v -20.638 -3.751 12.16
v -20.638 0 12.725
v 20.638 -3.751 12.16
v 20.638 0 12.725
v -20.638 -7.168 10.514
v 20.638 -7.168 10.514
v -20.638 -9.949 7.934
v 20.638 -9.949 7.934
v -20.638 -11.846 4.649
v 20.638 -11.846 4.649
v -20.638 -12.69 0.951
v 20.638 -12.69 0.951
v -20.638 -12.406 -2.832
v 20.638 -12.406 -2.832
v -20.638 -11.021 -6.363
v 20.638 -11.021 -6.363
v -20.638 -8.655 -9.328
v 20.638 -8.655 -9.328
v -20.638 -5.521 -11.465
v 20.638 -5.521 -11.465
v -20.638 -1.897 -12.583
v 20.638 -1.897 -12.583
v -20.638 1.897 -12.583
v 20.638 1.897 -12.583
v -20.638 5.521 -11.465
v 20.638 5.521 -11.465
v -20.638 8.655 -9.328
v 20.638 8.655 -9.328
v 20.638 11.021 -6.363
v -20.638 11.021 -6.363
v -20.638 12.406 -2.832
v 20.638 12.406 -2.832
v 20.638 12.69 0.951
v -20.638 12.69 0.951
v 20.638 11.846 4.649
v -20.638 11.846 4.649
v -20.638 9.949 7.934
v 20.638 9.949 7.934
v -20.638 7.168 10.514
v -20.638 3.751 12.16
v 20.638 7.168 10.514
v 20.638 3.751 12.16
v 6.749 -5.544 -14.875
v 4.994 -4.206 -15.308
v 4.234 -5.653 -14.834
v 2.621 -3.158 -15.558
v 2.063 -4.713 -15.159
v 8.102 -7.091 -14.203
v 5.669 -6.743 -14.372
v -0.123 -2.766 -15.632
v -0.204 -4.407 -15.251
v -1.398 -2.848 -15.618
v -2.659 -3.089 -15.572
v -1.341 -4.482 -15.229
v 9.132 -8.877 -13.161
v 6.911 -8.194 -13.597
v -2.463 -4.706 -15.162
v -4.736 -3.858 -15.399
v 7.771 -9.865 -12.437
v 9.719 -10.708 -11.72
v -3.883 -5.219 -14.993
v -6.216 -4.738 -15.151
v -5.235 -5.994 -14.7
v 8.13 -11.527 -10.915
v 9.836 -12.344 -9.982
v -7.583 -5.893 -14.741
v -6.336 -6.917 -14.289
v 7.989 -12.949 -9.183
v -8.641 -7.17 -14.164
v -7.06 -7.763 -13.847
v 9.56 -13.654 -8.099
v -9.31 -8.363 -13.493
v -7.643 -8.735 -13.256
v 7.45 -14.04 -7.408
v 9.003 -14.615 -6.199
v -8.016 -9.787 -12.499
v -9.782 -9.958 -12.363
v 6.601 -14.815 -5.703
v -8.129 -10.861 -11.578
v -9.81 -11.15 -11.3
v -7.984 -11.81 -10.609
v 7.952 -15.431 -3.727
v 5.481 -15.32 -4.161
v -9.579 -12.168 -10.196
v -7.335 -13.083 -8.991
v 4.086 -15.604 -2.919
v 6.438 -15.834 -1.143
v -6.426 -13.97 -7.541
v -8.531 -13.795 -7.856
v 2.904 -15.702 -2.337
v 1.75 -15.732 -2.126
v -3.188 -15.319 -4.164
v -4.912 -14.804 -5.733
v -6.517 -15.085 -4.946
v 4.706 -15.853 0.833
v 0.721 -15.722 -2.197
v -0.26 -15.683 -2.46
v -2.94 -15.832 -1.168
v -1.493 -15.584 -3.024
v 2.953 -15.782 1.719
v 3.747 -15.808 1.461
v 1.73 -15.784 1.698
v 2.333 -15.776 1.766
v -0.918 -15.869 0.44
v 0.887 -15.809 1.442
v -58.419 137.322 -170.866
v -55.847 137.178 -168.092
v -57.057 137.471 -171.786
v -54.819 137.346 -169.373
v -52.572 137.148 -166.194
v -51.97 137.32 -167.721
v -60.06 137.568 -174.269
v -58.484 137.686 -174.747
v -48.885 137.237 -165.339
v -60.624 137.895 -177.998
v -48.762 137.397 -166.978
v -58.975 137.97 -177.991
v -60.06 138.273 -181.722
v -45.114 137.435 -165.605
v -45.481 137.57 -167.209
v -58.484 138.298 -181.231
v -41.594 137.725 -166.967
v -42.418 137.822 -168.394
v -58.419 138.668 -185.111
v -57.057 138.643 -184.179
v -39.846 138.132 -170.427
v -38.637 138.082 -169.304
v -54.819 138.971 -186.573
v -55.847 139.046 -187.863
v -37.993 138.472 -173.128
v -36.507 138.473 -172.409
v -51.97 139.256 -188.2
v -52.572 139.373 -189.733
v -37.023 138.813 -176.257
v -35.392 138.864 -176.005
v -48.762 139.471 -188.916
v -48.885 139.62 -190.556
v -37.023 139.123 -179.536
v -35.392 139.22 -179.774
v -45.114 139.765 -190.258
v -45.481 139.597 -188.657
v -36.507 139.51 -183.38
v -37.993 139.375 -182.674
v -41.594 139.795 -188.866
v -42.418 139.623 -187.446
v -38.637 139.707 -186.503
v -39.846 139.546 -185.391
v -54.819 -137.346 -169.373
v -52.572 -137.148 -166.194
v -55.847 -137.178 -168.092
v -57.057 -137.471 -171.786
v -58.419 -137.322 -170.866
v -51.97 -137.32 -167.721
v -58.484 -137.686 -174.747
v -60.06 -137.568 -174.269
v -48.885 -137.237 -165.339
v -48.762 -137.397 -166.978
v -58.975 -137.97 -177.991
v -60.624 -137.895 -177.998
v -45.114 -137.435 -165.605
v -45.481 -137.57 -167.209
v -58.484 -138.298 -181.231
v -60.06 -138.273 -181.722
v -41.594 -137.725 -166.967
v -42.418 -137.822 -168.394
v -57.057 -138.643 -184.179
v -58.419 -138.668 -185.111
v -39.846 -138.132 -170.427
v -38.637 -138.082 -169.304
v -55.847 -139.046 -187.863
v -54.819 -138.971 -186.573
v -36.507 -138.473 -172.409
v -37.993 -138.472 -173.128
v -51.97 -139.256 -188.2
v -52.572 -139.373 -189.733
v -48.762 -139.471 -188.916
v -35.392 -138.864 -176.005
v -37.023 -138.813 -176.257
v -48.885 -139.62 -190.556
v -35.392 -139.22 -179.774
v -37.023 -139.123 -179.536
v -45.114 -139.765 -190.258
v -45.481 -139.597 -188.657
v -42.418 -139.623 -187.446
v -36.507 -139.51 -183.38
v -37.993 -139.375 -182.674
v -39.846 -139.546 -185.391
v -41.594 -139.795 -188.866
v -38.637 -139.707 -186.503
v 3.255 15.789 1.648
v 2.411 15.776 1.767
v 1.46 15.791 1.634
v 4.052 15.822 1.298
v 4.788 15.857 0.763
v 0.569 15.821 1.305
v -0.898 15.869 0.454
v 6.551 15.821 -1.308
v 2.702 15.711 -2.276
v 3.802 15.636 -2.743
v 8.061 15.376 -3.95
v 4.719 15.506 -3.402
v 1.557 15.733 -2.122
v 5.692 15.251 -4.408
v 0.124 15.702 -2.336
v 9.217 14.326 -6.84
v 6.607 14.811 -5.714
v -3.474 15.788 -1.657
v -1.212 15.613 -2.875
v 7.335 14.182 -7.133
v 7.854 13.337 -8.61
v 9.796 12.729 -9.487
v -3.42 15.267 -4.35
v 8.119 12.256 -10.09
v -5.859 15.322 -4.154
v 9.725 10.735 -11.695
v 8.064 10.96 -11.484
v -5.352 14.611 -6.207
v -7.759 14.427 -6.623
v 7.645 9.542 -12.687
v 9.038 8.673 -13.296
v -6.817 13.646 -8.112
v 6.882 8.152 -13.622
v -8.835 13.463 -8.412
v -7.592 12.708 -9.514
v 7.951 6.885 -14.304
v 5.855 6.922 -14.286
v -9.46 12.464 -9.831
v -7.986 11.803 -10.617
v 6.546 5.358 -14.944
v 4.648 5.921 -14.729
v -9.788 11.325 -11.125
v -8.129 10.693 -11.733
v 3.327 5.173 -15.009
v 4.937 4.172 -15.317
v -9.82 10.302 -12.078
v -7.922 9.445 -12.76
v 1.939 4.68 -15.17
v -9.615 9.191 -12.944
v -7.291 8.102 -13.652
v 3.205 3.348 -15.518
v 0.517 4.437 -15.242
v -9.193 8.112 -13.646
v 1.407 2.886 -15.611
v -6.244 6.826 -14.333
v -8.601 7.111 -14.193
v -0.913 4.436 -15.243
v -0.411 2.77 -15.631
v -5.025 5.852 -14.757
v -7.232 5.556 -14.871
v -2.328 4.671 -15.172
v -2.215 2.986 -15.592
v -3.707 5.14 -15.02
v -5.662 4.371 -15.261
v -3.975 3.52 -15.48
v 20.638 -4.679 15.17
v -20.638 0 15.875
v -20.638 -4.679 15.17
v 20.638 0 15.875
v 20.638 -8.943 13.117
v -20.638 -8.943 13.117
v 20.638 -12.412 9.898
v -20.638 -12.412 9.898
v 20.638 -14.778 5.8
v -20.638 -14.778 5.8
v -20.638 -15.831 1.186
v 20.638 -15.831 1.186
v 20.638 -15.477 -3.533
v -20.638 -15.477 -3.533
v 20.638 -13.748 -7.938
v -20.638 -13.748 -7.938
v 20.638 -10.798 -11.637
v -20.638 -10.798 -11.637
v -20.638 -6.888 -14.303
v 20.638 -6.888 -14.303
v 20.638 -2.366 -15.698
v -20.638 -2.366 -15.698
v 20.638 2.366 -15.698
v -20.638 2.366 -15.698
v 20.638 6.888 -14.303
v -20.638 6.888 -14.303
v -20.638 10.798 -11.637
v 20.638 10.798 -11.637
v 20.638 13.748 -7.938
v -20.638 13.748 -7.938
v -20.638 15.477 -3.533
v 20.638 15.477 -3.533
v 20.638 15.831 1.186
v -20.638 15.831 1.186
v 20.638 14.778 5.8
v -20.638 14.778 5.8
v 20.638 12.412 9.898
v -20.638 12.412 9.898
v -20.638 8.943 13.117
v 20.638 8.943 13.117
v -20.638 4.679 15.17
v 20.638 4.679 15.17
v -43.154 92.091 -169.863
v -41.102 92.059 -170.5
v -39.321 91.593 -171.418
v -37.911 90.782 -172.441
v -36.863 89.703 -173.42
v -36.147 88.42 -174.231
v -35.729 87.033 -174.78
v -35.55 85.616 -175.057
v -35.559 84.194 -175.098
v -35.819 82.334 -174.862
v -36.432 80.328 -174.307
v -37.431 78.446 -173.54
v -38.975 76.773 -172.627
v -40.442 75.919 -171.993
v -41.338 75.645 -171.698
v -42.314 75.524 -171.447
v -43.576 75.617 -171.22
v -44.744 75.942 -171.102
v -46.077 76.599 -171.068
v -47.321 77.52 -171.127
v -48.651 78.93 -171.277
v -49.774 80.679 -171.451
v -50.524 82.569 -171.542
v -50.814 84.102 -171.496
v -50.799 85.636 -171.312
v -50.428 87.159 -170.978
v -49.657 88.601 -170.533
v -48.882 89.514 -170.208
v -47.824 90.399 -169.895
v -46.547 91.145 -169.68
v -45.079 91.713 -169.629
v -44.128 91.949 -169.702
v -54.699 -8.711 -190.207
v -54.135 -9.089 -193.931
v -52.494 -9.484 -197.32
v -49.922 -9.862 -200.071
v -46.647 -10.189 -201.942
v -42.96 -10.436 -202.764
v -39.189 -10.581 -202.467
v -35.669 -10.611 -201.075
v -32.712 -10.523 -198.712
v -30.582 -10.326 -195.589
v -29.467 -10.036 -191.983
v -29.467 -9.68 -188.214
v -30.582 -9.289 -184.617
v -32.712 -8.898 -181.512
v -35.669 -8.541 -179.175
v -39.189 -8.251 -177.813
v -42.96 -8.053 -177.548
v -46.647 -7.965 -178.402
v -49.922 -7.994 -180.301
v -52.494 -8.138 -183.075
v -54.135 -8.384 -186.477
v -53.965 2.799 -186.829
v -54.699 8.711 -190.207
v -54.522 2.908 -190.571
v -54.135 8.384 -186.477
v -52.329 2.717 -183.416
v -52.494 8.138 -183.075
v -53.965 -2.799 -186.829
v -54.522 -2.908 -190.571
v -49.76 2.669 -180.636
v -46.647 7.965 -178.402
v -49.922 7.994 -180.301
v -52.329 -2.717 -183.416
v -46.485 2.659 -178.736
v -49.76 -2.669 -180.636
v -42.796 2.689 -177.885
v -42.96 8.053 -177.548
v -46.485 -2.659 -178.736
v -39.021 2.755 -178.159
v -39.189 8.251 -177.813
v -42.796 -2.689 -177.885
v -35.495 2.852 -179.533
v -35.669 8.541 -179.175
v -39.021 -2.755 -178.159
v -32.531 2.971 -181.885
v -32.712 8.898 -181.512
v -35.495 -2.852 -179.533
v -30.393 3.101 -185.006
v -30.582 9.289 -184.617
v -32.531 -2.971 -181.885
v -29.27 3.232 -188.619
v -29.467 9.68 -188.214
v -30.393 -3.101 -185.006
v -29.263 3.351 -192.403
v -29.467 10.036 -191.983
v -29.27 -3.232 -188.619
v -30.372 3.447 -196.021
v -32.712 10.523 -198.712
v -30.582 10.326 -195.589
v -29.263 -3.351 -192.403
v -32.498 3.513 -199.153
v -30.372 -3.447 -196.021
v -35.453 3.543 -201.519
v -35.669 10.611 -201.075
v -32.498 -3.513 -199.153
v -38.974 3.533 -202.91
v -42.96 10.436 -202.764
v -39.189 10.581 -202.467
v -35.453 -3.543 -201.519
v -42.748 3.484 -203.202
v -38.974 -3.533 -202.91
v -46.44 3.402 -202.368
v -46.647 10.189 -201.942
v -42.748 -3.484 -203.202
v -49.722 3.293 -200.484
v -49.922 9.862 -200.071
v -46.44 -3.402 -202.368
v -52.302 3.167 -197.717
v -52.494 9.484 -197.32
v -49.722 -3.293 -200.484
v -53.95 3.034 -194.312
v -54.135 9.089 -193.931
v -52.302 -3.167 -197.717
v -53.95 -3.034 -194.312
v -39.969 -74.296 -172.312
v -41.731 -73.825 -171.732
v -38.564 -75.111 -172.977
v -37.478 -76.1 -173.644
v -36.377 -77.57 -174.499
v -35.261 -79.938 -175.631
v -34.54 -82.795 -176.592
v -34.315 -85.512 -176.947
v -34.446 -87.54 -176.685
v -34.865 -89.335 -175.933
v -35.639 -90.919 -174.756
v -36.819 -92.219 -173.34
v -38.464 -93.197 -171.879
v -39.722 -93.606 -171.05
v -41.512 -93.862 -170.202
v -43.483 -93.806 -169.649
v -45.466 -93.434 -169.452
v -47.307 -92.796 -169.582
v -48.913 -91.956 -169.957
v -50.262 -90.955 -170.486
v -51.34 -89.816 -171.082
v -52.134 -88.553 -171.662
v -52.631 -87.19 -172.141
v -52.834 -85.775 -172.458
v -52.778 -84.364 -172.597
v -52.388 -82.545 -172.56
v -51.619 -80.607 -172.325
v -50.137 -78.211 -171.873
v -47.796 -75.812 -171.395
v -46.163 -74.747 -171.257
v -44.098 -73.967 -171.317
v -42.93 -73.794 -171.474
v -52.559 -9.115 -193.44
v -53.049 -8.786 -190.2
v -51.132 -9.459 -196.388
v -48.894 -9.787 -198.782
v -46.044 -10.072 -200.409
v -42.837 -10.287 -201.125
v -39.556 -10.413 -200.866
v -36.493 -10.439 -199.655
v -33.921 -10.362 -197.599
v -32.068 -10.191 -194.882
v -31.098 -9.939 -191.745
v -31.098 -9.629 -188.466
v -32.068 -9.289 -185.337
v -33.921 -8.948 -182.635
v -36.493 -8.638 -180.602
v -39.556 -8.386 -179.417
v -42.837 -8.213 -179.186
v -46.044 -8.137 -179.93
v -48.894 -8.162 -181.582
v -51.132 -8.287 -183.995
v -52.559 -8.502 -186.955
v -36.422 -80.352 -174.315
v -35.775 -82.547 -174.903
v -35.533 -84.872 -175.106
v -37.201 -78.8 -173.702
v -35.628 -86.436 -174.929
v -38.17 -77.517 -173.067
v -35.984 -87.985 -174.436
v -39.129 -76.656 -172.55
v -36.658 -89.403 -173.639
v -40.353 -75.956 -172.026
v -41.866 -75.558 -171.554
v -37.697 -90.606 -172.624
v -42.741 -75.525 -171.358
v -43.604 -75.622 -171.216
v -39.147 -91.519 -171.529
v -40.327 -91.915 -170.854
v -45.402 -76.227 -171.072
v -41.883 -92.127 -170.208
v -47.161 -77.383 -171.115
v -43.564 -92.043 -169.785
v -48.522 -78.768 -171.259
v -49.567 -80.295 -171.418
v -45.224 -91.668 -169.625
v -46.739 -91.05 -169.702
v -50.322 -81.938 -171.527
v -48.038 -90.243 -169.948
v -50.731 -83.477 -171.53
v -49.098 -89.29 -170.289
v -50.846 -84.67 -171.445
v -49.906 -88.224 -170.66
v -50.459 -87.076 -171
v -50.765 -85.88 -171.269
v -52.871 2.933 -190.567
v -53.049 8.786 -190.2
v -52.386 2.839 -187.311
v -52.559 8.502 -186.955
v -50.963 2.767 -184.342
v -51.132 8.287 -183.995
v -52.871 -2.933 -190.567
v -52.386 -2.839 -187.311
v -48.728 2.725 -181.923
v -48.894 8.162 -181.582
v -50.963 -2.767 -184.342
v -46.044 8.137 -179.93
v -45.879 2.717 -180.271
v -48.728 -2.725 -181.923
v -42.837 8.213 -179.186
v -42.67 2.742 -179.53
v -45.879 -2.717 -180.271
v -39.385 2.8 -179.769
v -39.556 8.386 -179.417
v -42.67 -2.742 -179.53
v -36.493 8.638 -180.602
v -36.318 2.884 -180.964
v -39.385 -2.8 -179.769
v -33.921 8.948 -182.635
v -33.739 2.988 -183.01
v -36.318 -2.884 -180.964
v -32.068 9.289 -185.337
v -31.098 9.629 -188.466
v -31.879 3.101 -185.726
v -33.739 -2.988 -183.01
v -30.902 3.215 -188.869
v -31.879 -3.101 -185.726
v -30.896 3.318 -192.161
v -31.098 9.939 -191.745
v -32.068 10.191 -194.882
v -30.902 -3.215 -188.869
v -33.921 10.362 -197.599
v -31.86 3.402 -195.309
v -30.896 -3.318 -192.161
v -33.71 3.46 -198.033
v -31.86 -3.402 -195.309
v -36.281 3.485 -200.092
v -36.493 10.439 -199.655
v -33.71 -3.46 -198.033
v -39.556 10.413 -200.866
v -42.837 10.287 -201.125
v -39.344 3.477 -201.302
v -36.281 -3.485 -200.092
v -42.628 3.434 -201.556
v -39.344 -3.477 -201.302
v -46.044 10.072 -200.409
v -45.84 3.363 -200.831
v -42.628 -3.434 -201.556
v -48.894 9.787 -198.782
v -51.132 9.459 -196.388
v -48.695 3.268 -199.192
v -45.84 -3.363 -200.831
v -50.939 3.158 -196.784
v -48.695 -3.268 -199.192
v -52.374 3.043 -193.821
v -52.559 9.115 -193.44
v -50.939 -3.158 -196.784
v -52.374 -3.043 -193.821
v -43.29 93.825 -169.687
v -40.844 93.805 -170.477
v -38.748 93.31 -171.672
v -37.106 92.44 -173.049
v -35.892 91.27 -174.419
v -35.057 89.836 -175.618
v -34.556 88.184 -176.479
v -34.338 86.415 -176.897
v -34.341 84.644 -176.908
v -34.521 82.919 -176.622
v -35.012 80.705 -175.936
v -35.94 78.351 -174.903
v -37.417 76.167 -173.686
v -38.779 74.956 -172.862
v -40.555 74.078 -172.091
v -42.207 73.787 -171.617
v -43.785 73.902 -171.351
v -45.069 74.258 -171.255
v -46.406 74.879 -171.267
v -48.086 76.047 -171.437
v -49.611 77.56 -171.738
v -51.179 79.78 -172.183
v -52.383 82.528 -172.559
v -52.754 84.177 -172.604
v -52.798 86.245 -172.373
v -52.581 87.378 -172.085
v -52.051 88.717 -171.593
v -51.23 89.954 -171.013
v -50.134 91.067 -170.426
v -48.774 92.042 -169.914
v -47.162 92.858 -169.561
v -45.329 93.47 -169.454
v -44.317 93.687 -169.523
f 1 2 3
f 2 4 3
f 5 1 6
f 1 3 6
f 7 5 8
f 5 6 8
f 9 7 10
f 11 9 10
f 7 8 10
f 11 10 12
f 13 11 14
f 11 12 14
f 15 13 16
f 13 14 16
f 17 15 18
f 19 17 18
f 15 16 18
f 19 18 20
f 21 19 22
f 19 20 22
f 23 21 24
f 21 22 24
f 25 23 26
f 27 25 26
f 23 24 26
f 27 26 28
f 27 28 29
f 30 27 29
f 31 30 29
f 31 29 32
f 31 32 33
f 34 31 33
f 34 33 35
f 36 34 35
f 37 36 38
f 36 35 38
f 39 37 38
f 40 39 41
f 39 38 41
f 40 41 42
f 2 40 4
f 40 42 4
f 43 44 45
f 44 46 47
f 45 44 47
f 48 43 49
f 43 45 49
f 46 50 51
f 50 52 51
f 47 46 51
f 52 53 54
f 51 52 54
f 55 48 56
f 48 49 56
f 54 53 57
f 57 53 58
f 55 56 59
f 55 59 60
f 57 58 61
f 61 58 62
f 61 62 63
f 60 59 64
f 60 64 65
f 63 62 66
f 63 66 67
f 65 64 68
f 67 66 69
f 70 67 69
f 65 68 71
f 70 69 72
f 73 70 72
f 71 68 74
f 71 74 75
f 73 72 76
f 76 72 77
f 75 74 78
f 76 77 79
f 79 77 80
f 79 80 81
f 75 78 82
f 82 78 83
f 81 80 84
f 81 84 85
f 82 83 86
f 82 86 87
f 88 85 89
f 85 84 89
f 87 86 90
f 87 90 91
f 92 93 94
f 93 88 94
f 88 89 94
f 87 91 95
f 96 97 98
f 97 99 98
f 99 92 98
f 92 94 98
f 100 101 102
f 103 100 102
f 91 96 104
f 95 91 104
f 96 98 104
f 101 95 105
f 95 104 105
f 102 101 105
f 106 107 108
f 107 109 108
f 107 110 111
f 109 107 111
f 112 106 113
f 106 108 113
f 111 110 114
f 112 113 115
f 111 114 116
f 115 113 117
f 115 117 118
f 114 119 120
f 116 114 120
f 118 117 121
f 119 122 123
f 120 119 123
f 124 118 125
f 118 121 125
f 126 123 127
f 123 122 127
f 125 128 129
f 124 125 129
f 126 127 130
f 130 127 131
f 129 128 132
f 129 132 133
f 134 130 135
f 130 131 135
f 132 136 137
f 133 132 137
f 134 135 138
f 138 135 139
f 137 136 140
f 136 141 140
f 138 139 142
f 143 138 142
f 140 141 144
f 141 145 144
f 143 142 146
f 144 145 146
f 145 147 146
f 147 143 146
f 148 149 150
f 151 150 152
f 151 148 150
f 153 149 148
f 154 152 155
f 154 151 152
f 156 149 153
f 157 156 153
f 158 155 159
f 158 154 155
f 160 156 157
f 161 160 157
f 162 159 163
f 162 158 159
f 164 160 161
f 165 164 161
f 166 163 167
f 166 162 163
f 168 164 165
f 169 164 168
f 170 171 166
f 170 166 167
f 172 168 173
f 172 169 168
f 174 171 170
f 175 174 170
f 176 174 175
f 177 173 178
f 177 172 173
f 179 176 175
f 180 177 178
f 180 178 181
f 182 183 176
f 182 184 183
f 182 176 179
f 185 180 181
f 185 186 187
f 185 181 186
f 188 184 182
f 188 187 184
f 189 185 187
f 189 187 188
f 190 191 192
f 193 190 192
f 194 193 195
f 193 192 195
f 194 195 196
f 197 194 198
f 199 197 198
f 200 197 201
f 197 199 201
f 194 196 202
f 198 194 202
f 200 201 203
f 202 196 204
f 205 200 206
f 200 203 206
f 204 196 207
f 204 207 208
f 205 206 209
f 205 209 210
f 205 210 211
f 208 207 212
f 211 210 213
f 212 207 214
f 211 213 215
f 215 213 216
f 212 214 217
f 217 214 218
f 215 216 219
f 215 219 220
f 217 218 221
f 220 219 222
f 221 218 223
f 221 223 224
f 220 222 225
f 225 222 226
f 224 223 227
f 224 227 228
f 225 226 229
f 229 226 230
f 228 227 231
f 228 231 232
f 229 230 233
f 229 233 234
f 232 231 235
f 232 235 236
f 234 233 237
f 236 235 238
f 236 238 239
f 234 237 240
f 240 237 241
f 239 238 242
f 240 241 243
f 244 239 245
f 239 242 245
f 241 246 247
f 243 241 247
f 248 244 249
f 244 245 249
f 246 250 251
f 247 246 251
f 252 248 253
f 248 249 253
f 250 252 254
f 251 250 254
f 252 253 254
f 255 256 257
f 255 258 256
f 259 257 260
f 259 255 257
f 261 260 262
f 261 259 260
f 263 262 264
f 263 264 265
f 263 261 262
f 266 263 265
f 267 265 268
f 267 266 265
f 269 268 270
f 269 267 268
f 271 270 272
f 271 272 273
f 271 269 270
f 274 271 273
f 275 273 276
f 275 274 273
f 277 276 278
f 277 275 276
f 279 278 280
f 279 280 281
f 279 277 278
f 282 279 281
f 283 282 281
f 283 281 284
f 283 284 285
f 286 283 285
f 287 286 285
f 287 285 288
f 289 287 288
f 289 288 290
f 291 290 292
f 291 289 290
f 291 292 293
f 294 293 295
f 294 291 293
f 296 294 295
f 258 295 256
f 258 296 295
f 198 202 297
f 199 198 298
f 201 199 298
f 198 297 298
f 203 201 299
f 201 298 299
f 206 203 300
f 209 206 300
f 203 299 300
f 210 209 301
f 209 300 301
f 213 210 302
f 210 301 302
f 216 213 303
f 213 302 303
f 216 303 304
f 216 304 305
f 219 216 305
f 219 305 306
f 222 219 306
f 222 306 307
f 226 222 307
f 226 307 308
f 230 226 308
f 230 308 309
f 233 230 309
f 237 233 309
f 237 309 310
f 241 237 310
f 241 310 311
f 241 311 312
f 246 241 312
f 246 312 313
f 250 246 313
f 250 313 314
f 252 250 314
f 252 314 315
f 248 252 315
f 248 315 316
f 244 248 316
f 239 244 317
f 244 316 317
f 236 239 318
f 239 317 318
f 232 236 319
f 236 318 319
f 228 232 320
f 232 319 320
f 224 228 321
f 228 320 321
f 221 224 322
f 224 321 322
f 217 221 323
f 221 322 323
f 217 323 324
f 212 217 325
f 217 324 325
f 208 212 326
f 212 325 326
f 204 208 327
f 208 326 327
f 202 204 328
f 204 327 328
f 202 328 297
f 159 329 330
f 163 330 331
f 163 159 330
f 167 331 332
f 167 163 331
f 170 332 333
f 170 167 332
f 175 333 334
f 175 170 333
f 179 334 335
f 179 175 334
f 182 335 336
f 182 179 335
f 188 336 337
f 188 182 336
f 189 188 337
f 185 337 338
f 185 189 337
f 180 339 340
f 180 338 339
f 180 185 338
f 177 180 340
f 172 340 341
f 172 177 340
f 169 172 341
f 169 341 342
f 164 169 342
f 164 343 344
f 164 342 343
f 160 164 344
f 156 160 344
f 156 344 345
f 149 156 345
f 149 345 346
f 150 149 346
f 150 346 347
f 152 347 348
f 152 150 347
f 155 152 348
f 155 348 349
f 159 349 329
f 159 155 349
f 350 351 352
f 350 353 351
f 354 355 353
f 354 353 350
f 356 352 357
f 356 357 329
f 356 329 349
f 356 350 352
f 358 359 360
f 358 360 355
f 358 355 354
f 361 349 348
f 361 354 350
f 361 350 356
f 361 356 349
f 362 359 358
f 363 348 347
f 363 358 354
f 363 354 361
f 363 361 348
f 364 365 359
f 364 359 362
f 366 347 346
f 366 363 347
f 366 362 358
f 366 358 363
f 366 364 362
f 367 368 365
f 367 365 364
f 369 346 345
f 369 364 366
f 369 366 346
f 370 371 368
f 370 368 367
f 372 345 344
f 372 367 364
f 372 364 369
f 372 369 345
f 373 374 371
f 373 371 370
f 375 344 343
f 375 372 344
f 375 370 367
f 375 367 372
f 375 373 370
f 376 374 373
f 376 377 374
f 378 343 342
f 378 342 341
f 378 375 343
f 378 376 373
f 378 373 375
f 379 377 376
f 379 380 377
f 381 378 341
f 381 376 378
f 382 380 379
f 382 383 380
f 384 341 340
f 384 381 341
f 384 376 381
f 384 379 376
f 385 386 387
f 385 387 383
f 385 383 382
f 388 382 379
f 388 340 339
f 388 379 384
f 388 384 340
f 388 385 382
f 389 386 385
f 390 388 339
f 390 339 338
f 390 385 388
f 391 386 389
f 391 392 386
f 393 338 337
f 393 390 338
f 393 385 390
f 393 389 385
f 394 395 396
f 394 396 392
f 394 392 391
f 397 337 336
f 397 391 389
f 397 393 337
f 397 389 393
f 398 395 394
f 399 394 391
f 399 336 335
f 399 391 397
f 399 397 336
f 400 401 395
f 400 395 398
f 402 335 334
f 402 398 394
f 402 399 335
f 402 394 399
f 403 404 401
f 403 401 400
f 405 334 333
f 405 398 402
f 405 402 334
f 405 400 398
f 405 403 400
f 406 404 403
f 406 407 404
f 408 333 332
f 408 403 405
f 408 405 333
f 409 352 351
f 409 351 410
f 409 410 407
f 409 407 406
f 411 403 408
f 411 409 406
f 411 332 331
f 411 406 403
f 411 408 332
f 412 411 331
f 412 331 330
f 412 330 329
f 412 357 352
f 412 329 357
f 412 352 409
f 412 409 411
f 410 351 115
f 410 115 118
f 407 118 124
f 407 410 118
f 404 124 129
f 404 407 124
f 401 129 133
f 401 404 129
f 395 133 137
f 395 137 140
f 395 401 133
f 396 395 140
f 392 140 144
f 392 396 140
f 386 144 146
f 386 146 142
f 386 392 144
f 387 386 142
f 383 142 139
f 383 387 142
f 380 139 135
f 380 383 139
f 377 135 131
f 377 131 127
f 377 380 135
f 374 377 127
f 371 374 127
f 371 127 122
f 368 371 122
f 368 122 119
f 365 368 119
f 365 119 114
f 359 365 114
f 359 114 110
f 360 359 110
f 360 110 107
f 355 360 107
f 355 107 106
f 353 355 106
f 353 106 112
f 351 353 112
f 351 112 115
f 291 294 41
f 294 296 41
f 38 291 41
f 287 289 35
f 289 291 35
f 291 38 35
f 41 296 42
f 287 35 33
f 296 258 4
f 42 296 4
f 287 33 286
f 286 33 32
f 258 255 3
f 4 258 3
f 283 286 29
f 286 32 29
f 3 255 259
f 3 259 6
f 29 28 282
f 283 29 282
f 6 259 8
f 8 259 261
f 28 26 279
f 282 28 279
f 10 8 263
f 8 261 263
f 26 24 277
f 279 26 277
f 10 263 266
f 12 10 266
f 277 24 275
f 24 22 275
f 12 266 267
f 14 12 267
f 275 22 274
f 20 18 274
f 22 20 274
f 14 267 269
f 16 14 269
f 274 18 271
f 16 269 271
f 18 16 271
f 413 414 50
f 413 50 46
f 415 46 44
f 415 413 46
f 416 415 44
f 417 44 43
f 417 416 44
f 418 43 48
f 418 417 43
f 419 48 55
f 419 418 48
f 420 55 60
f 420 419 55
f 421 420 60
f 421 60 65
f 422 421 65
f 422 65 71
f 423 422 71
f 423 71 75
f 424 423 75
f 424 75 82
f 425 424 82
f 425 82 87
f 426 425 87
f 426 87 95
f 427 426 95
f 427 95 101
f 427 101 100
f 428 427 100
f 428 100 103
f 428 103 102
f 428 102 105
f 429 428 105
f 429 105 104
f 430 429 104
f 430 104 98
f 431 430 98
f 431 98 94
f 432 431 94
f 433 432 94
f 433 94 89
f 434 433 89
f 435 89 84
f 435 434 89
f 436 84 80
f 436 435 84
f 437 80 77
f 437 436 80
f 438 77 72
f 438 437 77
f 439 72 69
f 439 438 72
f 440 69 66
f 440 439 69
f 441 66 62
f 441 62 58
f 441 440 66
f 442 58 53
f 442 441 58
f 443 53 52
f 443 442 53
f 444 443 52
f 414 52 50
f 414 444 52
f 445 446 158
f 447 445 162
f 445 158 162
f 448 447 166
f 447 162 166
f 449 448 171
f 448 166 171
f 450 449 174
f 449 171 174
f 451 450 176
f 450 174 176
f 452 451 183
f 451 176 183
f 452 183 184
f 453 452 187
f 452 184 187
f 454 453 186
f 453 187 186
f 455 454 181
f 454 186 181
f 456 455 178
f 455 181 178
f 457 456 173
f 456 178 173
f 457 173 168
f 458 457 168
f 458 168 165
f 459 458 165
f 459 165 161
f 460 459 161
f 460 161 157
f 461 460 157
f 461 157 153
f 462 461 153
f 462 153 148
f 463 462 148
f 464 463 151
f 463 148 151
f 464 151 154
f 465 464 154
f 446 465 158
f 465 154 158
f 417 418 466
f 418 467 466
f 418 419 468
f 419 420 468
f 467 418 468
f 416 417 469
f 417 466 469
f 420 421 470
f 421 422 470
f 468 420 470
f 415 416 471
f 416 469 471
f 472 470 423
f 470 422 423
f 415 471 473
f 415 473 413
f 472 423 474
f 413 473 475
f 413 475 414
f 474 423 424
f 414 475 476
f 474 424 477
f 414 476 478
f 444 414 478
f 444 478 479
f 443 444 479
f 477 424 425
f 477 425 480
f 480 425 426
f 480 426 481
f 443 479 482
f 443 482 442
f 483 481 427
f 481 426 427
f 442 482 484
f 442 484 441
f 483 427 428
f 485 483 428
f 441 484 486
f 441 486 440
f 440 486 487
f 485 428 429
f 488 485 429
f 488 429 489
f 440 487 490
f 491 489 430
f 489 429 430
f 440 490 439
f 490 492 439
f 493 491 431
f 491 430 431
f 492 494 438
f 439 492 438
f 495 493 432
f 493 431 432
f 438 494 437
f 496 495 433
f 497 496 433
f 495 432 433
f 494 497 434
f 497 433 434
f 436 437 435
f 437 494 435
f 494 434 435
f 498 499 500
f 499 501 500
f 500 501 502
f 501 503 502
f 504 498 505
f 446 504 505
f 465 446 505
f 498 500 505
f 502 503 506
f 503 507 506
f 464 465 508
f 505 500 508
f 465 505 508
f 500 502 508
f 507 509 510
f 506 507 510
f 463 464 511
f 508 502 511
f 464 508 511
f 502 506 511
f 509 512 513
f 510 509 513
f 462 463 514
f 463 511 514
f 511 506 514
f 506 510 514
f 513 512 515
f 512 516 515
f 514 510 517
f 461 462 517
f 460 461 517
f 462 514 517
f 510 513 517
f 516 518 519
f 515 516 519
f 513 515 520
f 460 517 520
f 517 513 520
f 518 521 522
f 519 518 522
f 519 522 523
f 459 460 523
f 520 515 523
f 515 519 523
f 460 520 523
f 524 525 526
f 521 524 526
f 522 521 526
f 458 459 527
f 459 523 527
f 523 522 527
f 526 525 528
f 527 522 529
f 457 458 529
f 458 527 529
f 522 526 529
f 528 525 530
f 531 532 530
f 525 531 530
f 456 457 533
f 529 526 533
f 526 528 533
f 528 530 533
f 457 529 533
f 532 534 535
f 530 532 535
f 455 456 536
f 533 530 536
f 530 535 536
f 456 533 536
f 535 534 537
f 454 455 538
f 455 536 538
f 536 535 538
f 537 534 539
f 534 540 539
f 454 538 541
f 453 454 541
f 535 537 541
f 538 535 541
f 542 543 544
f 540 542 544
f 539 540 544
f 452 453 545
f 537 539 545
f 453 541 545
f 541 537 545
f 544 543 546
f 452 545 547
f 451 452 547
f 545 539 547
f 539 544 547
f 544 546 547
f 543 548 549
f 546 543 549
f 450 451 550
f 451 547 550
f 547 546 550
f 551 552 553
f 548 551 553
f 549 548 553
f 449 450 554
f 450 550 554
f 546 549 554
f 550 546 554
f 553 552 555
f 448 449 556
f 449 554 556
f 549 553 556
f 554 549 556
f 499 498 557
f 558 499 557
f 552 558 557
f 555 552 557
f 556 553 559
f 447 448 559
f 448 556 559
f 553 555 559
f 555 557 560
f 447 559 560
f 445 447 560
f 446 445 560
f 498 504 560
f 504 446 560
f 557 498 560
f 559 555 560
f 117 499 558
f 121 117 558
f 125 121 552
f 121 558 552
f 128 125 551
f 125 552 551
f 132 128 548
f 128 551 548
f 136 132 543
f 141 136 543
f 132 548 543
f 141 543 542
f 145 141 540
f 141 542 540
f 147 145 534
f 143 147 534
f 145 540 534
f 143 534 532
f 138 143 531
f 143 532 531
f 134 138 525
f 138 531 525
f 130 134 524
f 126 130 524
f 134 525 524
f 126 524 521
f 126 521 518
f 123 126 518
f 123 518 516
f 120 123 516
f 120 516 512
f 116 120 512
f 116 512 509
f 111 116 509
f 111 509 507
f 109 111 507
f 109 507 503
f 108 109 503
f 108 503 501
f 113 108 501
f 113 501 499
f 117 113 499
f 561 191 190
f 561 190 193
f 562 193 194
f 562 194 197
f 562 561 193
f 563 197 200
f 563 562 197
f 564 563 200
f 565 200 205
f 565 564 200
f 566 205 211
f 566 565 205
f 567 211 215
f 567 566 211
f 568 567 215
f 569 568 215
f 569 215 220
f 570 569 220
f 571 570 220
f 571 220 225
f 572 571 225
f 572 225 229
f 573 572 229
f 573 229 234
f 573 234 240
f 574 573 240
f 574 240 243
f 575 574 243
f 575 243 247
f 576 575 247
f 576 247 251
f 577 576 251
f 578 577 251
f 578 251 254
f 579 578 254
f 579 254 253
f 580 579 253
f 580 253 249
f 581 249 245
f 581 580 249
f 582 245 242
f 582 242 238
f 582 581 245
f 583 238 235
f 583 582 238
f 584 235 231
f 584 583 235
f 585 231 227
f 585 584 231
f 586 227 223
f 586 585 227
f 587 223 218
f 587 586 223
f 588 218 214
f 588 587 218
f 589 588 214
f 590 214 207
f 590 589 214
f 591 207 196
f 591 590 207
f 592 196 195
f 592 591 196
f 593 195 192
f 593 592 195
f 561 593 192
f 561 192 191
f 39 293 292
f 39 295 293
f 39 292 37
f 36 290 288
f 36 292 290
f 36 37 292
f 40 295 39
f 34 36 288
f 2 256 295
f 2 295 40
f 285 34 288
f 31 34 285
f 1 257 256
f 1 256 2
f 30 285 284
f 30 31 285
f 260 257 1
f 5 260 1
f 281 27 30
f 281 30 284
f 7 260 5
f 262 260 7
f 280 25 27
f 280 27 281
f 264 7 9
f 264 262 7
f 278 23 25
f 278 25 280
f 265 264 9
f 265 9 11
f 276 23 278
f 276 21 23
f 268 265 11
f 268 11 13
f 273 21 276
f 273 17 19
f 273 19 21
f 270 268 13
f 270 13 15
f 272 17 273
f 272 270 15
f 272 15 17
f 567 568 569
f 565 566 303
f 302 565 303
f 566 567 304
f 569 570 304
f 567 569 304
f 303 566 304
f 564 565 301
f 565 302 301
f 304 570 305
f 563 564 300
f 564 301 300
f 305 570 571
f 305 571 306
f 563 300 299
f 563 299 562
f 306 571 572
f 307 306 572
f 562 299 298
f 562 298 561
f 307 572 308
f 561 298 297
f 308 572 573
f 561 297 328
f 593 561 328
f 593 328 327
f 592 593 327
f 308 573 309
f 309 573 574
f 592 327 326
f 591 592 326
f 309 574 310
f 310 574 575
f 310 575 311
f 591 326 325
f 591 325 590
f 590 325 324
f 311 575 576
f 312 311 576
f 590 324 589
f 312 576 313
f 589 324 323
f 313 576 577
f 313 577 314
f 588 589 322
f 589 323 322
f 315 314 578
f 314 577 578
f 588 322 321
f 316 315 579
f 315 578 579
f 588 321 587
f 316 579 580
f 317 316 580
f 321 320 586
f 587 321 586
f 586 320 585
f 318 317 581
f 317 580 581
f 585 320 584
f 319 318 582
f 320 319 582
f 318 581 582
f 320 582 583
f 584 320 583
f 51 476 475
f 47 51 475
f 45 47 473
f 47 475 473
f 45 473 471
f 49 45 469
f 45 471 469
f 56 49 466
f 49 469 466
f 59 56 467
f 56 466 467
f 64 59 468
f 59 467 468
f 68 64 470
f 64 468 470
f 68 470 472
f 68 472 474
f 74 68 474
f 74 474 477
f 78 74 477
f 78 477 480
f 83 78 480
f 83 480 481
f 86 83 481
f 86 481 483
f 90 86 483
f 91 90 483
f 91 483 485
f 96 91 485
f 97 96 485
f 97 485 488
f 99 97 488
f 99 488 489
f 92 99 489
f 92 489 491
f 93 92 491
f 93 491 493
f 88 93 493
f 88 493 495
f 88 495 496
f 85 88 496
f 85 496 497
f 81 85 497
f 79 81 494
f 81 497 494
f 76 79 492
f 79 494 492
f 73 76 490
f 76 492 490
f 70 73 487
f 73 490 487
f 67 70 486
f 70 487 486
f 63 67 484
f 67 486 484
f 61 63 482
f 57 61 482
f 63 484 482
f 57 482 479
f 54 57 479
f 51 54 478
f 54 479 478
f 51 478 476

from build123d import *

# Parameters (mm, degrees)
SKETCH6_W                = 41.275
SKETCH6_H                = 3.1496
BOSS_EXTRUDE1_REACH      = 236.173
BOSS_EXTRUDE1_END_RADIUS = 15.875
SKETCH10_R               = 9.525
SKETCH10_R_2             = 7.874
BOSS_EXTRUDE2_REACH      = 282.766
BOSS_EXTRUDE2_END_RADIUS = 15.875
SKETCH11_R               = 9.525
SKETCH11_R_2             = 7.874
SKETCH12_R               = 12.7
SKETCH15_R               = 12.7
SKETCH15_R_2             = 11.049


with BuildPart() as part:
    # Sketch6 → Revolve2 (revolve)
    with BuildSketch(Plane(origin=(0, 0, 0), x_dir=(1, 0, 0), z_dir=(0, 1, 0)), mode=Mode.PRIVATE) as revolve2_sk:
        with Locations((0, 14.3002)):
            Rectangle(SKETCH6_W, SKETCH6_H)
    revolve(revolve2_sk.sketch.rotate(Axis((-66.78681796, 0, 0), (1, 0, 0)), 180), axis=Axis((-66.78681796, 0, 0), (1, 0, 0)))


with BuildPart() as body_2:
    # Boss-Extrude1: up to this cylinder (the profile starts outside it)
    boss_extrude1_end = Plane(origin=(-45.678868, 0, 0), z_dir=(-1, 0, 0)) * Cylinder(BOSS_EXTRUDE1_END_RADIUS, 505.096, mode=Mode.PRIVATE)
    # Sketch10 → Boss-Extrude1 (new, up to the surface)
    with BuildSketch(Plane(origin=(-45.678868166, 89.236316096, -182.596530613), x_dir=(-0.9718118422845564, -0.09767658435659733, 0.21457173174471317), z_dir=(-0.23575780622388015, 0.40263040665345673, -0.8844812109042088)), mode=Mode.PRIVATE) as boss_extrude1_sk1:
        with Locations(Location((0, 0, 0), (0, 0, 90))):
            Circle(SKETCH10_R)
        with Locations(Location((0, 0, 0), (0, 0, 90))):
            Circle(SKETCH10_R_2, mode=Mode.SUBTRACT)
    boss_extrude1_tool1 = extrude(boss_extrude1_sk1.sketch, amount=-BOSS_EXTRUDE1_REACH, mode=Mode.PRIVATE) - boss_extrude1_end
    add(boss_extrude1_tool1.solids().sort_by_distance((-45.678868, 80.812466, -186.431206))[0])


with BuildPart() as body_3:
    # Boss-Extrude2: up to this cylinder (the profile starts outside it)
    boss_extrude2_end = Plane(origin=(-45.678868, 0, 0), z_dir=(-1, 0, 0)) * Cylinder(BOSS_EXTRUDE2_END_RADIUS, 598.282, mode=Mode.PRIVATE)
    # Sketch11 → Boss-Extrude2 (new, up to the surface)
    with BuildSketch(Plane(origin=(-45.678868166, -89.236316096, -182.596530613), x_dir=(-0.9718118422845564, 0.09767658435659739, 0.21457173174471303), z_dir=(-0.23575780622388004, -0.40263040665345723, -0.8844812109042086)), mode=Mode.PRIVATE) as boss_extrude2_sk1:
        with Locations(Location((0, 0, 0), (0, 0, 90))):
            Circle(SKETCH11_R)
        with Locations(Location((0, 0, 0), (0, 0, 90))):
            Circle(SKETCH11_R_2, mode=Mode.SUBTRACT)
    boss_extrude2_tool1 = extrude(boss_extrude2_sk1.sketch, amount=-BOSS_EXTRUDE2_REACH, mode=Mode.PRIVATE) - boss_extrude2_end
    add(boss_extrude2_tool1.solids().sort_by_distance((-45.678868, -97.660166, -178.761855))[0])


with BuildPart() as cut_sweep1_tool:
    # Cut-Sweep1: sweep along a curve in space
    with BuildLine() as cut_sweep1_path:
        Line((-47.937055144, 138.471469808, -177.943551359), (-42.011992023, 9.287572997, -190.152104526))
        ThreePointArc((-42.011992023, 9.287572997, -190.152104526), (-41.79958754, 0, -190.589762549), (-42.011992023, -9.287572997, -190.152104526))
        Line((-42.011992023, -9.287572997, -190.152104526), (-47.937055144, -138.471469808, -177.943551359))
    # Sketch12 → Cut-Sweep1 (sweep)
    with BuildSketch(Plane(origin=(-47.937055144, -138.471469808, -177.943551359), x_dir=(-0.9989591236170096, 0.045412012617268314, -0.004291672446182792), z_dir=(-0.045614354564503724, -0.9945278138635109, 0.09398807429418847))):
        Circle(SKETCH12_R)
    sweep(path=cut_sweep1_path.line)


with BuildPart() as body_2_1:
    add(body_2.part)

    # Cut-Sweep1: cut by cut_sweep1_tool
    add(cut_sweep1_tool.part, mode=Mode.SUBTRACT)


with BuildPart() as body_3_1:
    add(body_3.part)

    # Cut-Sweep1: cut by cut_sweep1_tool
    add(cut_sweep1_tool.part, mode=Mode.SUBTRACT)


with BuildPart() as body_4:
    # Sweep2: sweep along a path in Sketch14
    with BuildLine(Plane(origin=(-108.695110163, 0, -52.751982968), x_dir=(0.43661741575798063, 0, -0.8996472821371844), z_dir=(0.8996472821371844, 0, 0.43661741575798063))) as sweep2_path:
        Line((139.156279218, 138.471469808), (152.726656641, 9.287572997))
        ThreePointArc((152.726656641, 9.287572997), (153.213133989, 0), (152.726656641, -9.287572997))
        Line((152.726656641, -9.287572997), (139.156279218, -138.471469808))
    # Sketch15 → Sweep2 (sweep)
    with BuildSketch(Plane(origin=(-47.937055144, -138.471469808, -177.943551359), x_dir=(-0.9989591236170096, 0.045412012617268314, -0.004291672446182792), z_dir=(-0.045614354564503724, -0.9945278138635109, 0.09398807429418847))):
        Circle(SKETCH15_R)
        Circle(SKETCH15_R_2, mode=Mode.SUBTRACT)
    sweep(path=sweep2_path.line)


solid = Compound([part.part, body_2_1.part, body_3_1.part, body_4.part])
